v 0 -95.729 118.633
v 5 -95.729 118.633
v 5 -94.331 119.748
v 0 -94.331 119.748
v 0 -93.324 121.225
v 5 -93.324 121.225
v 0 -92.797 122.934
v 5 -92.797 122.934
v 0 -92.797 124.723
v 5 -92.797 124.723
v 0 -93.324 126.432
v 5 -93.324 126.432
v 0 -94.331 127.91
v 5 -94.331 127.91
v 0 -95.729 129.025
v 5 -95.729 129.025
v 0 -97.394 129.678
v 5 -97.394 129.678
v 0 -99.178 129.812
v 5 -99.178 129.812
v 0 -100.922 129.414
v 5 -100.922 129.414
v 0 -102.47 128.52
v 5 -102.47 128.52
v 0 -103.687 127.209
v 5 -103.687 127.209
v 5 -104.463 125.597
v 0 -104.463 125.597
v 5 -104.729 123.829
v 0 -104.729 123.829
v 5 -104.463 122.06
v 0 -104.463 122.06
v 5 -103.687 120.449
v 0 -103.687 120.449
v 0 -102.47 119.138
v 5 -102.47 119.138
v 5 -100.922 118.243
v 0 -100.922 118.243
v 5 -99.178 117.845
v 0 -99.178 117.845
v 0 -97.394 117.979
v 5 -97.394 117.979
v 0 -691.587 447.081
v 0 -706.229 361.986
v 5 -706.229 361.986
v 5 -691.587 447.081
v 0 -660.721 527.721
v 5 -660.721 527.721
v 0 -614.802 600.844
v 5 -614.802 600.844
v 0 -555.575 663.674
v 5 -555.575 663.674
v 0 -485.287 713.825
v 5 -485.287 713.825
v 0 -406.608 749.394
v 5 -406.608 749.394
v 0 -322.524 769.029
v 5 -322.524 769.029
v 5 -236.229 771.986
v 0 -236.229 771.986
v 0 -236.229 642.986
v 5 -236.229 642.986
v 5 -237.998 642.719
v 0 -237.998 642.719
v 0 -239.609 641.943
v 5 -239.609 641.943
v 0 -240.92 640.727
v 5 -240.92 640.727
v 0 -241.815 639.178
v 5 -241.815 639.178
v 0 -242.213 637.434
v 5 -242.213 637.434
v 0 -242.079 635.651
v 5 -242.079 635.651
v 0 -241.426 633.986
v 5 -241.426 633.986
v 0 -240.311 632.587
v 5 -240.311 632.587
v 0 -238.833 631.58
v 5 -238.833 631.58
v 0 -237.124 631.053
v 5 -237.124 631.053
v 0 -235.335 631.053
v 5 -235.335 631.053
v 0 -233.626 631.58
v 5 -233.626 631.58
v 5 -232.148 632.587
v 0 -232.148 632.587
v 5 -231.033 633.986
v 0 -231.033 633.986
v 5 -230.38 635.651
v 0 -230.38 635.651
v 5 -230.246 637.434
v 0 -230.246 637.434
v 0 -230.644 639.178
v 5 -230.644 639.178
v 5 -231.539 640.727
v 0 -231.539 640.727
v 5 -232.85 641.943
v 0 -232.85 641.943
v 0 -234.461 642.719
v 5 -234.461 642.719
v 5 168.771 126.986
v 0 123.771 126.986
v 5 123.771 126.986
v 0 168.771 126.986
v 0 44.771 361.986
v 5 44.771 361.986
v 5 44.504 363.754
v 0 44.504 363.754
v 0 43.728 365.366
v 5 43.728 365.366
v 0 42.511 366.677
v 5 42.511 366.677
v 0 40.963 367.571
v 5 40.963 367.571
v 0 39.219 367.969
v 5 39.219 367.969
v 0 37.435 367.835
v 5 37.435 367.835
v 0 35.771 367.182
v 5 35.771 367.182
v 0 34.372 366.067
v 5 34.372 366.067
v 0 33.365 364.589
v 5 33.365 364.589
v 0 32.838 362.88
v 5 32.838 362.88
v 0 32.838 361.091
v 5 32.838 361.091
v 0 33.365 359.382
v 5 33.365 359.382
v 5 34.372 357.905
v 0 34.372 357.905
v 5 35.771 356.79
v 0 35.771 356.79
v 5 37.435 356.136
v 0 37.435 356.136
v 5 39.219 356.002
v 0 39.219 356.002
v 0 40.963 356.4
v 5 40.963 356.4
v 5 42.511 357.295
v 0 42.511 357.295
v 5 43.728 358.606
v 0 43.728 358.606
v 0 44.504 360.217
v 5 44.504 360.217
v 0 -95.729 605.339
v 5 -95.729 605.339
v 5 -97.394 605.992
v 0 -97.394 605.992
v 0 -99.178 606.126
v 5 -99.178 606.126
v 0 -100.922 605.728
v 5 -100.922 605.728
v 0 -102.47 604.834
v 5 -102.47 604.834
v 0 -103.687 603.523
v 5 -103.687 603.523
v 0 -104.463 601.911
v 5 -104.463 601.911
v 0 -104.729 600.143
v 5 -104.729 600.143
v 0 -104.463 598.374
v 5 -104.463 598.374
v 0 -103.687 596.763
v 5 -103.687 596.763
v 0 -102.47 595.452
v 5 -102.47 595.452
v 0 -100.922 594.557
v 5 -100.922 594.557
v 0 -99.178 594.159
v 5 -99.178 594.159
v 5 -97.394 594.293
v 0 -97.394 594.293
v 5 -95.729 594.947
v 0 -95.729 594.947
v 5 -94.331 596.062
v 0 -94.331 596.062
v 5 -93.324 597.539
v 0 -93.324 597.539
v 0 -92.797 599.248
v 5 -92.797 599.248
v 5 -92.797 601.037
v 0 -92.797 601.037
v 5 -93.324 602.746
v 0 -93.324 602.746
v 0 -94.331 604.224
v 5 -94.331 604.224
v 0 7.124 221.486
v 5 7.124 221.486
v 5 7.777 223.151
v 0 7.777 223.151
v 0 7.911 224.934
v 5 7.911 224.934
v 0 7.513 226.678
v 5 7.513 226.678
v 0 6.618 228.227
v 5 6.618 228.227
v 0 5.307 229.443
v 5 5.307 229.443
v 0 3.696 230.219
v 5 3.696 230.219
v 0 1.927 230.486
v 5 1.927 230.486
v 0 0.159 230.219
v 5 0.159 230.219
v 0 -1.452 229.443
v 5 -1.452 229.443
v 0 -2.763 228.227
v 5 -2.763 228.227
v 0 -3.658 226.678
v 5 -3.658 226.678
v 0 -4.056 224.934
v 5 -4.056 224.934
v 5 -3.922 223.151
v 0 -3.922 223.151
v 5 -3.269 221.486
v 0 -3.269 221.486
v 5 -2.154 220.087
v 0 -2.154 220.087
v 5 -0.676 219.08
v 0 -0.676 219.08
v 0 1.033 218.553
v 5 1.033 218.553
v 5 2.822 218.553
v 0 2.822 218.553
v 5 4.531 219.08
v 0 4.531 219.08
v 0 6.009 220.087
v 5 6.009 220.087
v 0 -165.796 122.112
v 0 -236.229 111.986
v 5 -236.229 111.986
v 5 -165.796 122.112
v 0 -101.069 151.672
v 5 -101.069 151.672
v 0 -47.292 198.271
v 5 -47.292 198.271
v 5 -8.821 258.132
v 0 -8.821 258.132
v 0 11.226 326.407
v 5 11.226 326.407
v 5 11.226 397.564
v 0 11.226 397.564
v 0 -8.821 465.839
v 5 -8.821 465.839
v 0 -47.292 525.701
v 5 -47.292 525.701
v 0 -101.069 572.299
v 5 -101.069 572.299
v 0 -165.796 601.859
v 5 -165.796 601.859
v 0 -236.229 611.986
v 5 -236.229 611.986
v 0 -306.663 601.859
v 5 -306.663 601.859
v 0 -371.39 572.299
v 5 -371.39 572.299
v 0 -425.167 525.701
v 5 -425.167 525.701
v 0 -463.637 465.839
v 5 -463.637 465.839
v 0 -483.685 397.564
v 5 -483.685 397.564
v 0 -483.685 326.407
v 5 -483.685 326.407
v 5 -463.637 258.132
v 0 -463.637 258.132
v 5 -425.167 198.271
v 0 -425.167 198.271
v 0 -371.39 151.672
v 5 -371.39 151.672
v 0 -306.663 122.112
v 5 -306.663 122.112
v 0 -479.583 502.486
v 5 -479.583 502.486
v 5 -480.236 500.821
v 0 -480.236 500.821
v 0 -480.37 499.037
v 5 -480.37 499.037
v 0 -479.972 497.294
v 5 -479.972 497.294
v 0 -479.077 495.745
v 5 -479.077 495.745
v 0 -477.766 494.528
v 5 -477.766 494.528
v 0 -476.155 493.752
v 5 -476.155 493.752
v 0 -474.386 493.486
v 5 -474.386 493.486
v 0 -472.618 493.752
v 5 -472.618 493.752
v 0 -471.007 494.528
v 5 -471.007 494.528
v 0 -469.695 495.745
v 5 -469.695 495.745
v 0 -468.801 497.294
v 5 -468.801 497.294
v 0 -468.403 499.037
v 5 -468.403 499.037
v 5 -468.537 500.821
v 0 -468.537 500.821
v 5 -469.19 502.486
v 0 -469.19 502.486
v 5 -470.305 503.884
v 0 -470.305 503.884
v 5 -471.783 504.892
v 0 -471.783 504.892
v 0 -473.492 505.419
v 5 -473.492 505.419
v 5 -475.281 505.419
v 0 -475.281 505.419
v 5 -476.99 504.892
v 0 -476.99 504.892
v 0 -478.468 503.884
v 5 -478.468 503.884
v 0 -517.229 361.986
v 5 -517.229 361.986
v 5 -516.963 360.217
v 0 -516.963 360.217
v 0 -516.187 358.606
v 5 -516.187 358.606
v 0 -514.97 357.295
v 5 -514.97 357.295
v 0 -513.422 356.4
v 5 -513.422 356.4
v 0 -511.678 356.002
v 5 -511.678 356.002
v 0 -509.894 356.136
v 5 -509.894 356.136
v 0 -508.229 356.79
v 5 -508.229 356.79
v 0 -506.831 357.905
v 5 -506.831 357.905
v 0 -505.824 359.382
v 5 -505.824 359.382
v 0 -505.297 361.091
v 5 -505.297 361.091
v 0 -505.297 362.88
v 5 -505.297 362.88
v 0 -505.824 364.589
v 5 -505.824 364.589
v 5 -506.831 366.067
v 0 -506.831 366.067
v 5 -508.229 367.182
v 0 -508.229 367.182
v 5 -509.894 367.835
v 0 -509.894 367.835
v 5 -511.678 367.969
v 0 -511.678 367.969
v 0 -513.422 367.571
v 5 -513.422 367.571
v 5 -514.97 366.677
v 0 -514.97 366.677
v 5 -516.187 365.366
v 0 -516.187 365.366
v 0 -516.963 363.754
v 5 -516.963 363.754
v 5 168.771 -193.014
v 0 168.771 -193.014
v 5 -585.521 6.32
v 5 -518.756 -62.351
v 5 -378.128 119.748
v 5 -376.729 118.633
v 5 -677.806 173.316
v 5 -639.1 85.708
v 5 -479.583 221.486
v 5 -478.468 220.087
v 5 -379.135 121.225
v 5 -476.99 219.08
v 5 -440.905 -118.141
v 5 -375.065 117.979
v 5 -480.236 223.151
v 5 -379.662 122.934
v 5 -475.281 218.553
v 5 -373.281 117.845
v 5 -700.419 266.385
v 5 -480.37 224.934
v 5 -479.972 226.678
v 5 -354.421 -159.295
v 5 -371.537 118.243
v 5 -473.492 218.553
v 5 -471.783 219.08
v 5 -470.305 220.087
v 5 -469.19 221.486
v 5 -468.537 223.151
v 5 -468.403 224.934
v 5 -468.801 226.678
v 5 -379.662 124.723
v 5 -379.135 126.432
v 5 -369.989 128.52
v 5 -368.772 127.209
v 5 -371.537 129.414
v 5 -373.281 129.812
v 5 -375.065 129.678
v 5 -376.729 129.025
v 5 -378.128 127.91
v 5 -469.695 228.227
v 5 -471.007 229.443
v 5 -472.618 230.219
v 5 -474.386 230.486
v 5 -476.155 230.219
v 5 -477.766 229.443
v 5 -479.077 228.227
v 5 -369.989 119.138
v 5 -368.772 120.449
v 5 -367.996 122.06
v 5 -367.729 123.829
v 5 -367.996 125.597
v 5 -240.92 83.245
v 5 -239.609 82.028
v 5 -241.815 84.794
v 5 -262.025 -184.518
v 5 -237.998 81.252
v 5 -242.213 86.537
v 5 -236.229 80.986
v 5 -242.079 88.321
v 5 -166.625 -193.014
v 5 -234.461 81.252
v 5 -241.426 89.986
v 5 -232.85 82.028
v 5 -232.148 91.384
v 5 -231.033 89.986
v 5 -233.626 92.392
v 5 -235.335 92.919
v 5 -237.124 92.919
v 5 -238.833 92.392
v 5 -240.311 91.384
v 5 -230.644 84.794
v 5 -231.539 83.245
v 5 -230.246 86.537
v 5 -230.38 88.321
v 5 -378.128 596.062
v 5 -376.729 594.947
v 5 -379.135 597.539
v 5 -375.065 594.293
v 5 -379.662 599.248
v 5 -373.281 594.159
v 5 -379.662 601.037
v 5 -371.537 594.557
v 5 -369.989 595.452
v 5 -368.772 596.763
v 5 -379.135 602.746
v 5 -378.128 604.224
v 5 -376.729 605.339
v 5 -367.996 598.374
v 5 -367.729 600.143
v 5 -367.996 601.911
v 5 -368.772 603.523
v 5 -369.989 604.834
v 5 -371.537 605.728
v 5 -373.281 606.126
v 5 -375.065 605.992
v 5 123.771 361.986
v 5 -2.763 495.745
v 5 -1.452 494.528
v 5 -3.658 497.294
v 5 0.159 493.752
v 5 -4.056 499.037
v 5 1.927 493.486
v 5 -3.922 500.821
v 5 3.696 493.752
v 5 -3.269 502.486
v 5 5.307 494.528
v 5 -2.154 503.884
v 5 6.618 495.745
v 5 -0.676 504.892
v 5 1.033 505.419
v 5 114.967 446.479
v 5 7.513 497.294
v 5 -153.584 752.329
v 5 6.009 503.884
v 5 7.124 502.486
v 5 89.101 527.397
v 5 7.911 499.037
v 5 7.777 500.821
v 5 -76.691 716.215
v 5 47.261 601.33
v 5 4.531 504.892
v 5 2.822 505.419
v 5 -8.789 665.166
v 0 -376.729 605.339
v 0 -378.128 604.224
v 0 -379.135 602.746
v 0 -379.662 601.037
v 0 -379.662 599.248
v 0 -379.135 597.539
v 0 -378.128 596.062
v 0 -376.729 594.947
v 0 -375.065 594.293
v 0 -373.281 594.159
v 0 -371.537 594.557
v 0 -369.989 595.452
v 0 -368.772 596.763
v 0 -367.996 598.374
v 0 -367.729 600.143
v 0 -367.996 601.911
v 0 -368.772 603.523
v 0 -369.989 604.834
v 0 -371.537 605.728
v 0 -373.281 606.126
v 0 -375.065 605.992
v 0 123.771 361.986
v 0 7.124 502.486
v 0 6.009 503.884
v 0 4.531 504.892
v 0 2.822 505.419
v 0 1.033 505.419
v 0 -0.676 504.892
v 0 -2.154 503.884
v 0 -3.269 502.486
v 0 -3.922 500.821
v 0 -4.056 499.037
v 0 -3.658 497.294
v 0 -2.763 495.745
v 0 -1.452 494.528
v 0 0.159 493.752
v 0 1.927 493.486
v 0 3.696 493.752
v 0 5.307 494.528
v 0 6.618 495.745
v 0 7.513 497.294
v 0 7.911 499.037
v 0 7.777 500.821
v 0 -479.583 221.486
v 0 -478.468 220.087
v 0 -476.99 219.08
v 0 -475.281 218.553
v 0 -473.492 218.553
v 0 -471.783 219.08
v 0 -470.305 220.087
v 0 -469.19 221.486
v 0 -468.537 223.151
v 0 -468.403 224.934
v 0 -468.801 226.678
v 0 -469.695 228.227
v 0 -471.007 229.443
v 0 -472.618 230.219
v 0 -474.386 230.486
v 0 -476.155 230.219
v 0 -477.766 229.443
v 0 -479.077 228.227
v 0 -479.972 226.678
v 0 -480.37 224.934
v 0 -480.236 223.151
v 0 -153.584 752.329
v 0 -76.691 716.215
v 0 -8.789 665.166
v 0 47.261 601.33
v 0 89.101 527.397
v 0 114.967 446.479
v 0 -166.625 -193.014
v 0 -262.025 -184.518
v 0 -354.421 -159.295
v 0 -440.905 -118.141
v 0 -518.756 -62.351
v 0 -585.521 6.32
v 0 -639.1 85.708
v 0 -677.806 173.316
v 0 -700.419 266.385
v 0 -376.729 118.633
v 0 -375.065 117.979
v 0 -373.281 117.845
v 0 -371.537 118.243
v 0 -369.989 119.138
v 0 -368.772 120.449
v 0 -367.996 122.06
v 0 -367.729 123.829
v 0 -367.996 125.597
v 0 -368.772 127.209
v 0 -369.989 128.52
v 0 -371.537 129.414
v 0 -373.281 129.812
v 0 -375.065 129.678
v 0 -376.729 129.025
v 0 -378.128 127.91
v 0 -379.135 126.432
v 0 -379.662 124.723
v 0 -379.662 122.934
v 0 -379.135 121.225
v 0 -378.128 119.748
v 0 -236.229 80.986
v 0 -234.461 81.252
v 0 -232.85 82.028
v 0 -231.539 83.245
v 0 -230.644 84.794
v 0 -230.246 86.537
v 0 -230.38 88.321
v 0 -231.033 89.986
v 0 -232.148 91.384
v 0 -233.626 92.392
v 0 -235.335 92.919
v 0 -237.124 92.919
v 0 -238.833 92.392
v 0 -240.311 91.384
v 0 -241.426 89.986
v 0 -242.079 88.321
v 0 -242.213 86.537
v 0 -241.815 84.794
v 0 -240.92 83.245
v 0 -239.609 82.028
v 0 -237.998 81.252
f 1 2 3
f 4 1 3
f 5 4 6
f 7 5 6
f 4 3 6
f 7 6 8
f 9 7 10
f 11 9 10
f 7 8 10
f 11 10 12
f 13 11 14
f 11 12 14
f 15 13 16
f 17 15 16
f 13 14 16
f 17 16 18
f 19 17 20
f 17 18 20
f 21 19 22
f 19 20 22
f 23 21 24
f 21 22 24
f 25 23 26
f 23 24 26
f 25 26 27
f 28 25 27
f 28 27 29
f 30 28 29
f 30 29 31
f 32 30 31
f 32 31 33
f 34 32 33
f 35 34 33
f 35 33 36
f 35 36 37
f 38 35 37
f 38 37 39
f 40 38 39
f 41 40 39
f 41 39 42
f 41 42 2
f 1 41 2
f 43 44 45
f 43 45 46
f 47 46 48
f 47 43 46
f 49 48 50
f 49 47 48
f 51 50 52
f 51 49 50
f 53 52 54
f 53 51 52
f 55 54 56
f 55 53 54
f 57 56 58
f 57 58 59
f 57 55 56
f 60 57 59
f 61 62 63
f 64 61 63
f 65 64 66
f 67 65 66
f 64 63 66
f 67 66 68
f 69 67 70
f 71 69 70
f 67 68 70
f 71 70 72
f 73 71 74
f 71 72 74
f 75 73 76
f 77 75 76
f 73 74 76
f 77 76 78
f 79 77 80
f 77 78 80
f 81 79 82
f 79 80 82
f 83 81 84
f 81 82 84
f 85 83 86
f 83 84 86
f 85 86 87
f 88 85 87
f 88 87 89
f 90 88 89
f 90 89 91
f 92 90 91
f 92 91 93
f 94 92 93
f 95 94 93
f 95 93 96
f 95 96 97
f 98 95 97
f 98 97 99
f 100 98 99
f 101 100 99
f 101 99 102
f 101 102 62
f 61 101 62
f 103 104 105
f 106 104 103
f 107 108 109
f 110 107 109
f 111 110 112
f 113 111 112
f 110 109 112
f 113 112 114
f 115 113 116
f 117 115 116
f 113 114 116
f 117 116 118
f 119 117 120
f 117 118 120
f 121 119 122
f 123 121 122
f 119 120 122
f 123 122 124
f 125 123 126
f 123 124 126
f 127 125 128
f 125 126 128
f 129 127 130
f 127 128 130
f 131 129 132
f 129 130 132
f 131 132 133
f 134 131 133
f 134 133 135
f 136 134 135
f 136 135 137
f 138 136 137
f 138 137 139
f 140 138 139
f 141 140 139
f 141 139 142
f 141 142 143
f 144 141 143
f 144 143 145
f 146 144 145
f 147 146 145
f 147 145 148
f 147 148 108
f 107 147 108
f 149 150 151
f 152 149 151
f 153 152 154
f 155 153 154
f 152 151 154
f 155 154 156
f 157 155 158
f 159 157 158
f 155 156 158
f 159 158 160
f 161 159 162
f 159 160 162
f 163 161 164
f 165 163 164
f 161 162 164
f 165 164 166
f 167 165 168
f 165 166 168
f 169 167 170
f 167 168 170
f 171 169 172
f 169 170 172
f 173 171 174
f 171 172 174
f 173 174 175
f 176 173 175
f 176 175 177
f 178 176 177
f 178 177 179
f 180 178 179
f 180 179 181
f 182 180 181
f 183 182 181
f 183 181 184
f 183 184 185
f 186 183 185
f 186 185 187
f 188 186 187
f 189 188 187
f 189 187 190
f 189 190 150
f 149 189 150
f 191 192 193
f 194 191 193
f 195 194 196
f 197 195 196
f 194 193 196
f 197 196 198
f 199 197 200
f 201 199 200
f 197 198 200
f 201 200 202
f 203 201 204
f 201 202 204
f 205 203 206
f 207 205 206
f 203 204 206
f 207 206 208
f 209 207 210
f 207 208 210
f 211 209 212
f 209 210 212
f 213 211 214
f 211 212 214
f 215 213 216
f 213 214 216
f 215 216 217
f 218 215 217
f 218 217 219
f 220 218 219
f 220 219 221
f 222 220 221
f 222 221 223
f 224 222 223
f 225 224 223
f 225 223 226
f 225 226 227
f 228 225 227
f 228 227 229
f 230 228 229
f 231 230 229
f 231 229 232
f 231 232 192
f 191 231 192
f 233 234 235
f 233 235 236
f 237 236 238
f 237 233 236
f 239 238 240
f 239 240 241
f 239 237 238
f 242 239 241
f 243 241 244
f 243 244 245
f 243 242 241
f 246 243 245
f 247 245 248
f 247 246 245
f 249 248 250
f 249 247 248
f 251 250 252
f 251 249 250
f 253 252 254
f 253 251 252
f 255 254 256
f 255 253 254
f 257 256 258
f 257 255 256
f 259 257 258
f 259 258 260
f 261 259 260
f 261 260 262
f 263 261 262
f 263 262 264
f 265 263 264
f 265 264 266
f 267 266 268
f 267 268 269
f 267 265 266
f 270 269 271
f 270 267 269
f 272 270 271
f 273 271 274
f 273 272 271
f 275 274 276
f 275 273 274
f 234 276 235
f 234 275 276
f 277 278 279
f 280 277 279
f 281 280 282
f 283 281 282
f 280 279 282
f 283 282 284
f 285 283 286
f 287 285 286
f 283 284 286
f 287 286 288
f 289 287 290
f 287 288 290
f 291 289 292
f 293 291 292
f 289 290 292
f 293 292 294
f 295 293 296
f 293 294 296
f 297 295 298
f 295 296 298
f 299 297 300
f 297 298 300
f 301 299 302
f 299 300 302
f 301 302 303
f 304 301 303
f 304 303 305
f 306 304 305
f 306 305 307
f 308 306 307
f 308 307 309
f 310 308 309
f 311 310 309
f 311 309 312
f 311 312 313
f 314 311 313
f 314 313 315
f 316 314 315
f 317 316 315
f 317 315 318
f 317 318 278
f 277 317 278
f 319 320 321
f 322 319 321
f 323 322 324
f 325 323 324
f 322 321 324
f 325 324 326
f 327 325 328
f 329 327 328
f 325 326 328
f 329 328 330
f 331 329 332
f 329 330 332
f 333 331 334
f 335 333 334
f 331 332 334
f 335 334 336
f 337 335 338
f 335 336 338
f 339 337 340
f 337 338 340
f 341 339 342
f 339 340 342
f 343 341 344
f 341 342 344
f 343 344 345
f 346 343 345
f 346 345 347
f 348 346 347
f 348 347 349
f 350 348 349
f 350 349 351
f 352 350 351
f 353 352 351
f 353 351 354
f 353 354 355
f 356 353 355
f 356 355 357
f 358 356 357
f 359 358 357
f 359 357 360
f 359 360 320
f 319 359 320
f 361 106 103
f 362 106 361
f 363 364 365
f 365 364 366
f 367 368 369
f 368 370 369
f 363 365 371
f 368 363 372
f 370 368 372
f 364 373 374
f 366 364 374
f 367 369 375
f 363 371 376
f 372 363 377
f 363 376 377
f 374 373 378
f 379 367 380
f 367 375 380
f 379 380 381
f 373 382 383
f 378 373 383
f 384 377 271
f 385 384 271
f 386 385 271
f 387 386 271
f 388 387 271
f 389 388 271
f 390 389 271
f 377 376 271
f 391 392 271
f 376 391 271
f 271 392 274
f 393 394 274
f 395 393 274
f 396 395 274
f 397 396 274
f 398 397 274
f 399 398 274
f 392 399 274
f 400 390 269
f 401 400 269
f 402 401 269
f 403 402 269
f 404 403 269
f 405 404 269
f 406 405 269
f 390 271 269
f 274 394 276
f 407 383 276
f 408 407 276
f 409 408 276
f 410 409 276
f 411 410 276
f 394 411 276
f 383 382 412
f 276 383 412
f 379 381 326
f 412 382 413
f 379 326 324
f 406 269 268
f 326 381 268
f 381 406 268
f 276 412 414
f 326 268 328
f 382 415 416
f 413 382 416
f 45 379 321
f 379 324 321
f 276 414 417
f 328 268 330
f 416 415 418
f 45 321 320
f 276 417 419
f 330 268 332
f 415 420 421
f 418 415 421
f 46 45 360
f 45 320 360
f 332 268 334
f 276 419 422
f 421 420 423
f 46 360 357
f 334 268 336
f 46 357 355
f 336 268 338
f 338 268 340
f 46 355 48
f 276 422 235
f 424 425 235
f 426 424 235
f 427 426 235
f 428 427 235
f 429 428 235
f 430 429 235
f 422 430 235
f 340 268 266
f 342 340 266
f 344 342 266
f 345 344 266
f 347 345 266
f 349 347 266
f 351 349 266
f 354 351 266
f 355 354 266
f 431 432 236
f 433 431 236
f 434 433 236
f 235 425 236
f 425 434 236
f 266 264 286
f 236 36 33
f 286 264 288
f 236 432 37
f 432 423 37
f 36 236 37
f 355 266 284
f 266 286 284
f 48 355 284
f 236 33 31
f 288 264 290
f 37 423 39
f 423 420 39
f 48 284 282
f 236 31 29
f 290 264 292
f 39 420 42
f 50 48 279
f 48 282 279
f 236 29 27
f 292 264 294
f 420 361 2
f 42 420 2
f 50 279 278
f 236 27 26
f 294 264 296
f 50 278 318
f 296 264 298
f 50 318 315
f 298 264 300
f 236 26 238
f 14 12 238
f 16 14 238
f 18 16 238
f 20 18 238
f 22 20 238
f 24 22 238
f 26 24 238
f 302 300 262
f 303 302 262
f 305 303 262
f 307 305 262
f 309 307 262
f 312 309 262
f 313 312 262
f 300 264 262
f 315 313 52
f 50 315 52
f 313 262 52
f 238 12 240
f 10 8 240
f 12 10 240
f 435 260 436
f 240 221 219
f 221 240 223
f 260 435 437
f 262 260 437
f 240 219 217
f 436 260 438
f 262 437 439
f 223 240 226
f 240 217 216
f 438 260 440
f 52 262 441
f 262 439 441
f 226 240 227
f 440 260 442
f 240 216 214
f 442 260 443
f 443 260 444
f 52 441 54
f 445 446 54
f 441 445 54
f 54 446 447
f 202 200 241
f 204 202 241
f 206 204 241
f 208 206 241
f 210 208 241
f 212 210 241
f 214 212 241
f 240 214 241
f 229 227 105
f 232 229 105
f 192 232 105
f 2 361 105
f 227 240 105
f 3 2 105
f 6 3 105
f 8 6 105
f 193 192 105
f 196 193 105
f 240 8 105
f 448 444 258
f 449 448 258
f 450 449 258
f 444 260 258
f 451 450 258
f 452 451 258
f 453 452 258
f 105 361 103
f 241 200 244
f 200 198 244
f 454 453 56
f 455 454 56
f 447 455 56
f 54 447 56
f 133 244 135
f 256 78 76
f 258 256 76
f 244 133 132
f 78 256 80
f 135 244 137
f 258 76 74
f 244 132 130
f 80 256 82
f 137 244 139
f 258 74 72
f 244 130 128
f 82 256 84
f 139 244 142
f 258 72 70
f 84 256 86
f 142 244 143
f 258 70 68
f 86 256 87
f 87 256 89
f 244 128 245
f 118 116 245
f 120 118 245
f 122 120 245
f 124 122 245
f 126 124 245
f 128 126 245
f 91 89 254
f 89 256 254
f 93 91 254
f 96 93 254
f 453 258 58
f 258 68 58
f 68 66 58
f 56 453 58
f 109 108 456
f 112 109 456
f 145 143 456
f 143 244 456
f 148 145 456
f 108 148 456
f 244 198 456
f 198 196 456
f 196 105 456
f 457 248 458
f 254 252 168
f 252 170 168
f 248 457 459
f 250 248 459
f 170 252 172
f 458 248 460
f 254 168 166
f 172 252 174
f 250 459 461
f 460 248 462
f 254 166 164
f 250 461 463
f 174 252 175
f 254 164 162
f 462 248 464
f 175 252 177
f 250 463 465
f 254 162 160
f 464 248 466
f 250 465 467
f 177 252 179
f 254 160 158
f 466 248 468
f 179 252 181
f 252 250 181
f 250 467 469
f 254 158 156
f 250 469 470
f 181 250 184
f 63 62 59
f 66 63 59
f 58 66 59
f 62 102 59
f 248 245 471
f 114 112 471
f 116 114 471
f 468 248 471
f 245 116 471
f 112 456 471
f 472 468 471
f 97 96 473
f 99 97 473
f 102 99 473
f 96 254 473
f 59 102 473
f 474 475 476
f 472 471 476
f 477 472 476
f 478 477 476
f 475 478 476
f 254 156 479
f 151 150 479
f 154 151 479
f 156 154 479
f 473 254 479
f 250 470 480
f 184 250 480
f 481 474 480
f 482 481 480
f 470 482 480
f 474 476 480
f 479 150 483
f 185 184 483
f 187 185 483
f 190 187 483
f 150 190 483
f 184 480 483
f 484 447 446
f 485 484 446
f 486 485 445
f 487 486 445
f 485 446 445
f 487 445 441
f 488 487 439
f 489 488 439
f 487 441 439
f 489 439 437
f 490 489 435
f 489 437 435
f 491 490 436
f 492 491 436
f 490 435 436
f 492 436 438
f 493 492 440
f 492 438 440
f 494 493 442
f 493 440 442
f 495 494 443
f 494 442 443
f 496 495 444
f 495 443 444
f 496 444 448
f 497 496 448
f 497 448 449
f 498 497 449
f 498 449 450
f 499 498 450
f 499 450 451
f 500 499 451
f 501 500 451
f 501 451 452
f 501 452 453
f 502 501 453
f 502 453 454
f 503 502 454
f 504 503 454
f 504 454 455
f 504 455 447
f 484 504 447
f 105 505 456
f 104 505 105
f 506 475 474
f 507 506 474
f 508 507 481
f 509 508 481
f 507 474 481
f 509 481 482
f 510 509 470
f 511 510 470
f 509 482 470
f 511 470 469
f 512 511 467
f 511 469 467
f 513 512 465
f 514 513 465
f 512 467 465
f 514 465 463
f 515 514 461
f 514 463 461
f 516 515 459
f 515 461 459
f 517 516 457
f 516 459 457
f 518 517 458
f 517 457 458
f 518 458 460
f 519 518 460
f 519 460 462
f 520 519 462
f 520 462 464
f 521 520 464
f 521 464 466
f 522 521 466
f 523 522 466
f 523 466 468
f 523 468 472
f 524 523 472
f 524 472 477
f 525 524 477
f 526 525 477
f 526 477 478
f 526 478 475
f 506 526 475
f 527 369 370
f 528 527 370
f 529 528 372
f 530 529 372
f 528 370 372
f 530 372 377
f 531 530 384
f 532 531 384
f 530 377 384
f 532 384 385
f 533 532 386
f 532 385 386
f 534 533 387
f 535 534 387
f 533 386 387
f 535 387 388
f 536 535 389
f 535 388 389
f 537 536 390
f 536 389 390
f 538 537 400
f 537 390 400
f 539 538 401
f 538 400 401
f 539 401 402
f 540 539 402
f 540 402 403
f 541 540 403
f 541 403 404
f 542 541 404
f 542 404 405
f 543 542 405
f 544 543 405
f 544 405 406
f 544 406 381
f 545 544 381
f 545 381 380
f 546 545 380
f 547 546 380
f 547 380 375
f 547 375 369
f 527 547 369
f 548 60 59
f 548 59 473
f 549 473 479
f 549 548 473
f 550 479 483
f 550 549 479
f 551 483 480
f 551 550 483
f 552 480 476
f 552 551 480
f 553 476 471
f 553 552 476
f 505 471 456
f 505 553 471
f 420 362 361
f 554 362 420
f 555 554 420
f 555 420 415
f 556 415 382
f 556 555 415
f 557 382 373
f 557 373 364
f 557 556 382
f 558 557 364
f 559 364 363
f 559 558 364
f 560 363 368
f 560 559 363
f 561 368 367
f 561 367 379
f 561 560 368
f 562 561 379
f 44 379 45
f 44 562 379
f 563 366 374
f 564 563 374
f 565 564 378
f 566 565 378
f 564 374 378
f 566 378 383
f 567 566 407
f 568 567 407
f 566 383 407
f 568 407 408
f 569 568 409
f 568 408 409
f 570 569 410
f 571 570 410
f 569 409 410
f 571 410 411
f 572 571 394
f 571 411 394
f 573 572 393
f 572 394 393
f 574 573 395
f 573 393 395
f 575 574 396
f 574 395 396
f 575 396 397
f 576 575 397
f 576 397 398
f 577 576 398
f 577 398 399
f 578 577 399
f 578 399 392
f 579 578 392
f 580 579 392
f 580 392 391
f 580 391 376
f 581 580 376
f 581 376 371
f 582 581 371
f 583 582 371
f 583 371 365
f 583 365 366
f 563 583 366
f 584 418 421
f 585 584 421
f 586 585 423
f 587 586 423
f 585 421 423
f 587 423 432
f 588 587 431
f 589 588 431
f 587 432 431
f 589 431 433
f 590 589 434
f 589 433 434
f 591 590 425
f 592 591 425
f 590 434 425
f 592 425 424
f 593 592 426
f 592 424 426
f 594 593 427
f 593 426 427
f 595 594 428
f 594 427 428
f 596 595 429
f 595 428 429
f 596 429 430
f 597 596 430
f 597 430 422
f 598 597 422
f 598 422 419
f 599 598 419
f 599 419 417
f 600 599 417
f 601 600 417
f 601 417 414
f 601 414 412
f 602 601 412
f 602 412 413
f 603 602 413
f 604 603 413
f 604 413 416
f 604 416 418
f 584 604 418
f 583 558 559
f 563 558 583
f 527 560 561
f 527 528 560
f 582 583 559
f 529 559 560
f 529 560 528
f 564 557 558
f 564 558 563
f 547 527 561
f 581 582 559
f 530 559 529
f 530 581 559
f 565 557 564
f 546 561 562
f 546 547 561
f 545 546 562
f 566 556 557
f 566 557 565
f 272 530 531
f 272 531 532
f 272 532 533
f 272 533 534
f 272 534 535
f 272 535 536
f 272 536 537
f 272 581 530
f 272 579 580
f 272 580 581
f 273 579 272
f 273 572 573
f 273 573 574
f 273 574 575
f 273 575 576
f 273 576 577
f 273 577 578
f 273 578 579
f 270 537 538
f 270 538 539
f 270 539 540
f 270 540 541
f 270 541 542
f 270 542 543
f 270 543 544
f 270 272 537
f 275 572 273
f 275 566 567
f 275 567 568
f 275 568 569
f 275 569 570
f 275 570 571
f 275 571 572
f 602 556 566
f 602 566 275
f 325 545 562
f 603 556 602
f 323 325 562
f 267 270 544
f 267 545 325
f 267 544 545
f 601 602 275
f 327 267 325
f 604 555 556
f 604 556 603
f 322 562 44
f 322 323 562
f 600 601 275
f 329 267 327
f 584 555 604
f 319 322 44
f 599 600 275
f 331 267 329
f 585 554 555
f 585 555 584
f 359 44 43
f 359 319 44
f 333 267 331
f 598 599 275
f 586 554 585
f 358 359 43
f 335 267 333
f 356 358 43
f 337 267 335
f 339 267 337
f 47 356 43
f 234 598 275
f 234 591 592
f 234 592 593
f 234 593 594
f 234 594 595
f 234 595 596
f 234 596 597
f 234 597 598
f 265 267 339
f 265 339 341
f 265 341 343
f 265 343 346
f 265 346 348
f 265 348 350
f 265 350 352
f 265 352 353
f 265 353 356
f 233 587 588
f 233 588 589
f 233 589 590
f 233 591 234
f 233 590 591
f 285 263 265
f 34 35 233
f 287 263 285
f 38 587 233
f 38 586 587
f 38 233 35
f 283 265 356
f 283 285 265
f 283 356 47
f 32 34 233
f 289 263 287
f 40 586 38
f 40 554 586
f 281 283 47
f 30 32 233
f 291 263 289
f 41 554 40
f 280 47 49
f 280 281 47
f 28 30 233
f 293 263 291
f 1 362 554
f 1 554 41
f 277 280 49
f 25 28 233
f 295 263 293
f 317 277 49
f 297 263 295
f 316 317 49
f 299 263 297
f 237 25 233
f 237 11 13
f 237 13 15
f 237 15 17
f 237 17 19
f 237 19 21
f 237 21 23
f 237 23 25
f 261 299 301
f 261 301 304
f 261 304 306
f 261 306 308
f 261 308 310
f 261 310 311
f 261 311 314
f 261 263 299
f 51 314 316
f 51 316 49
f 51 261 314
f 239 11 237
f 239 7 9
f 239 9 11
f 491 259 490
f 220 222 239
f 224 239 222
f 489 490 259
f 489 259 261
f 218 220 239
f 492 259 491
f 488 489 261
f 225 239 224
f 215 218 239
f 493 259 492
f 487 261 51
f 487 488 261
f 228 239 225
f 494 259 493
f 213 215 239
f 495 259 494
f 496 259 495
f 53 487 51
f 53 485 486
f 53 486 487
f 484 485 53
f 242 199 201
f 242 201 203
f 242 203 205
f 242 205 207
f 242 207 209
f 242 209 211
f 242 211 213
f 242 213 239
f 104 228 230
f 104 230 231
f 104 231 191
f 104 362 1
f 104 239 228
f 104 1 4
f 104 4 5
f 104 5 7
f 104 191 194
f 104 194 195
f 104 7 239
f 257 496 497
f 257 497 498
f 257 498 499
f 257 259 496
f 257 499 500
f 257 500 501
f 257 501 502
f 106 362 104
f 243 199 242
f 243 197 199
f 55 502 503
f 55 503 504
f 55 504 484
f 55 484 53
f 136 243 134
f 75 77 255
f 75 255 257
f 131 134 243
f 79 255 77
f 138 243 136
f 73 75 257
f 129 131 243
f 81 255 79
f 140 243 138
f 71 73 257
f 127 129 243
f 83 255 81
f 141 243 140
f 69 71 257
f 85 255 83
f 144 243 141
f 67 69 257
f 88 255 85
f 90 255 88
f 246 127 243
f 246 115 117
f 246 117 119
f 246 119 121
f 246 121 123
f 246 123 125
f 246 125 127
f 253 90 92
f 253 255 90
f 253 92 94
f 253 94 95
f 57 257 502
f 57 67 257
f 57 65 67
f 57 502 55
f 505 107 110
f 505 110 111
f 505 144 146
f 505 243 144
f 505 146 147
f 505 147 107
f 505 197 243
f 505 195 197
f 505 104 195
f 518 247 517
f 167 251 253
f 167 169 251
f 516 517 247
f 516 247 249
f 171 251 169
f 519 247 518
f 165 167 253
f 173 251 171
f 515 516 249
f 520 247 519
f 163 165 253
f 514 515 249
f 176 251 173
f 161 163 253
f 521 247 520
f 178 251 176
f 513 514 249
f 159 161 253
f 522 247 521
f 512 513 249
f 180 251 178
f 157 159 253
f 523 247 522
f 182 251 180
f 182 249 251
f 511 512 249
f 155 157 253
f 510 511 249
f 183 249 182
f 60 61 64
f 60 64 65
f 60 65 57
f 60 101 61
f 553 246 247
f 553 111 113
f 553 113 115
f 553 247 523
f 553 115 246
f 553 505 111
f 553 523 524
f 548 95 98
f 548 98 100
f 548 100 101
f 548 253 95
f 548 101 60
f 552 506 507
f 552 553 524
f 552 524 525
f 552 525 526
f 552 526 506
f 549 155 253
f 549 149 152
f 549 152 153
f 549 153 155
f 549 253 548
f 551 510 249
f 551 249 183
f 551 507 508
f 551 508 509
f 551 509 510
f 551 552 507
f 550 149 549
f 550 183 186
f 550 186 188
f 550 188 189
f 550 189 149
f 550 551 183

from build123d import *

# Parameters (mm, degrees)
SKETCH1_R           = 250
BOSS_EXTRUDE1_DEPTH = 5
SKETCH2_R           = 6
CUT_EXTRUDE1_DEPTH  = 10
CIRPATTERN1_COUNT   = 12


with BuildPart() as part:
    # Sketch1 → Boss-Extrude1 (new body)
    with BuildSketch(Plane(origin=(0, 0, 0), x_dir=(0, 0, -1), z_dir=(1, 0, 0))):
        with BuildLine():
            Line((-126.985698369, 168.770507744), (193.014301631, 168.770507744))
            Line((193.014301631, 168.770507744), (193.014301631, -166.625210225))
            ThreePointArc((193.014301631, -166.625210225), (29.499330124, -553.664543235), (-361.985698369, -706.229492256))
            ThreePointArc((-361.985698369, -706.229492256), (-663.674001264, -555.574607548), (-771.985698369, -236.229492256))
            ThreePointArc((-771.985698369, -236.229492256), (-634.689640971, 20.877775707), (-361.985698369, 123.770507744))
            Line((-361.985698369, 123.770507744), (-126.985698369, 123.770507744))
            Line((-126.985698369, 123.770507744), (-126.985698369, 168.770507744))
        make_face()
        with Locations((-361.985698369, -236.229492256)):
            Circle(SKETCH1_R, mode=Mode.SUBTRACT)
    extrude(amount=BOSS_EXTRUDE1_DEPTH)

    # Sketch2 → Cut-Extrude1 (cut)
    with BuildSketch(Plane(origin=(5, 0, 0), x_dir=(0, 0, -1), z_dir=(1, 0, 0))):
        with Locations((-86.985698369, -236.229492256)):
            Circle(SKETCH2_R)
    cut_extrude1 = extrude(amount=-CUT_EXTRUDE1_DEPTH, mode=Mode.SUBTRACT)

    # CirPattern1: Cut-Extrude1 ×12 about axis
    cirpattern1_axis = Axis((0, -236.229492256, 361.985698369), (1, 0, 0))
    for i in range(1, CIRPATTERN1_COUNT):
        add(cut_extrude1.rotate(cirpattern1_axis, i * 360 / CIRPATTERN1_COUNT), mode=Mode.SUBTRACT)


solid = part.part
